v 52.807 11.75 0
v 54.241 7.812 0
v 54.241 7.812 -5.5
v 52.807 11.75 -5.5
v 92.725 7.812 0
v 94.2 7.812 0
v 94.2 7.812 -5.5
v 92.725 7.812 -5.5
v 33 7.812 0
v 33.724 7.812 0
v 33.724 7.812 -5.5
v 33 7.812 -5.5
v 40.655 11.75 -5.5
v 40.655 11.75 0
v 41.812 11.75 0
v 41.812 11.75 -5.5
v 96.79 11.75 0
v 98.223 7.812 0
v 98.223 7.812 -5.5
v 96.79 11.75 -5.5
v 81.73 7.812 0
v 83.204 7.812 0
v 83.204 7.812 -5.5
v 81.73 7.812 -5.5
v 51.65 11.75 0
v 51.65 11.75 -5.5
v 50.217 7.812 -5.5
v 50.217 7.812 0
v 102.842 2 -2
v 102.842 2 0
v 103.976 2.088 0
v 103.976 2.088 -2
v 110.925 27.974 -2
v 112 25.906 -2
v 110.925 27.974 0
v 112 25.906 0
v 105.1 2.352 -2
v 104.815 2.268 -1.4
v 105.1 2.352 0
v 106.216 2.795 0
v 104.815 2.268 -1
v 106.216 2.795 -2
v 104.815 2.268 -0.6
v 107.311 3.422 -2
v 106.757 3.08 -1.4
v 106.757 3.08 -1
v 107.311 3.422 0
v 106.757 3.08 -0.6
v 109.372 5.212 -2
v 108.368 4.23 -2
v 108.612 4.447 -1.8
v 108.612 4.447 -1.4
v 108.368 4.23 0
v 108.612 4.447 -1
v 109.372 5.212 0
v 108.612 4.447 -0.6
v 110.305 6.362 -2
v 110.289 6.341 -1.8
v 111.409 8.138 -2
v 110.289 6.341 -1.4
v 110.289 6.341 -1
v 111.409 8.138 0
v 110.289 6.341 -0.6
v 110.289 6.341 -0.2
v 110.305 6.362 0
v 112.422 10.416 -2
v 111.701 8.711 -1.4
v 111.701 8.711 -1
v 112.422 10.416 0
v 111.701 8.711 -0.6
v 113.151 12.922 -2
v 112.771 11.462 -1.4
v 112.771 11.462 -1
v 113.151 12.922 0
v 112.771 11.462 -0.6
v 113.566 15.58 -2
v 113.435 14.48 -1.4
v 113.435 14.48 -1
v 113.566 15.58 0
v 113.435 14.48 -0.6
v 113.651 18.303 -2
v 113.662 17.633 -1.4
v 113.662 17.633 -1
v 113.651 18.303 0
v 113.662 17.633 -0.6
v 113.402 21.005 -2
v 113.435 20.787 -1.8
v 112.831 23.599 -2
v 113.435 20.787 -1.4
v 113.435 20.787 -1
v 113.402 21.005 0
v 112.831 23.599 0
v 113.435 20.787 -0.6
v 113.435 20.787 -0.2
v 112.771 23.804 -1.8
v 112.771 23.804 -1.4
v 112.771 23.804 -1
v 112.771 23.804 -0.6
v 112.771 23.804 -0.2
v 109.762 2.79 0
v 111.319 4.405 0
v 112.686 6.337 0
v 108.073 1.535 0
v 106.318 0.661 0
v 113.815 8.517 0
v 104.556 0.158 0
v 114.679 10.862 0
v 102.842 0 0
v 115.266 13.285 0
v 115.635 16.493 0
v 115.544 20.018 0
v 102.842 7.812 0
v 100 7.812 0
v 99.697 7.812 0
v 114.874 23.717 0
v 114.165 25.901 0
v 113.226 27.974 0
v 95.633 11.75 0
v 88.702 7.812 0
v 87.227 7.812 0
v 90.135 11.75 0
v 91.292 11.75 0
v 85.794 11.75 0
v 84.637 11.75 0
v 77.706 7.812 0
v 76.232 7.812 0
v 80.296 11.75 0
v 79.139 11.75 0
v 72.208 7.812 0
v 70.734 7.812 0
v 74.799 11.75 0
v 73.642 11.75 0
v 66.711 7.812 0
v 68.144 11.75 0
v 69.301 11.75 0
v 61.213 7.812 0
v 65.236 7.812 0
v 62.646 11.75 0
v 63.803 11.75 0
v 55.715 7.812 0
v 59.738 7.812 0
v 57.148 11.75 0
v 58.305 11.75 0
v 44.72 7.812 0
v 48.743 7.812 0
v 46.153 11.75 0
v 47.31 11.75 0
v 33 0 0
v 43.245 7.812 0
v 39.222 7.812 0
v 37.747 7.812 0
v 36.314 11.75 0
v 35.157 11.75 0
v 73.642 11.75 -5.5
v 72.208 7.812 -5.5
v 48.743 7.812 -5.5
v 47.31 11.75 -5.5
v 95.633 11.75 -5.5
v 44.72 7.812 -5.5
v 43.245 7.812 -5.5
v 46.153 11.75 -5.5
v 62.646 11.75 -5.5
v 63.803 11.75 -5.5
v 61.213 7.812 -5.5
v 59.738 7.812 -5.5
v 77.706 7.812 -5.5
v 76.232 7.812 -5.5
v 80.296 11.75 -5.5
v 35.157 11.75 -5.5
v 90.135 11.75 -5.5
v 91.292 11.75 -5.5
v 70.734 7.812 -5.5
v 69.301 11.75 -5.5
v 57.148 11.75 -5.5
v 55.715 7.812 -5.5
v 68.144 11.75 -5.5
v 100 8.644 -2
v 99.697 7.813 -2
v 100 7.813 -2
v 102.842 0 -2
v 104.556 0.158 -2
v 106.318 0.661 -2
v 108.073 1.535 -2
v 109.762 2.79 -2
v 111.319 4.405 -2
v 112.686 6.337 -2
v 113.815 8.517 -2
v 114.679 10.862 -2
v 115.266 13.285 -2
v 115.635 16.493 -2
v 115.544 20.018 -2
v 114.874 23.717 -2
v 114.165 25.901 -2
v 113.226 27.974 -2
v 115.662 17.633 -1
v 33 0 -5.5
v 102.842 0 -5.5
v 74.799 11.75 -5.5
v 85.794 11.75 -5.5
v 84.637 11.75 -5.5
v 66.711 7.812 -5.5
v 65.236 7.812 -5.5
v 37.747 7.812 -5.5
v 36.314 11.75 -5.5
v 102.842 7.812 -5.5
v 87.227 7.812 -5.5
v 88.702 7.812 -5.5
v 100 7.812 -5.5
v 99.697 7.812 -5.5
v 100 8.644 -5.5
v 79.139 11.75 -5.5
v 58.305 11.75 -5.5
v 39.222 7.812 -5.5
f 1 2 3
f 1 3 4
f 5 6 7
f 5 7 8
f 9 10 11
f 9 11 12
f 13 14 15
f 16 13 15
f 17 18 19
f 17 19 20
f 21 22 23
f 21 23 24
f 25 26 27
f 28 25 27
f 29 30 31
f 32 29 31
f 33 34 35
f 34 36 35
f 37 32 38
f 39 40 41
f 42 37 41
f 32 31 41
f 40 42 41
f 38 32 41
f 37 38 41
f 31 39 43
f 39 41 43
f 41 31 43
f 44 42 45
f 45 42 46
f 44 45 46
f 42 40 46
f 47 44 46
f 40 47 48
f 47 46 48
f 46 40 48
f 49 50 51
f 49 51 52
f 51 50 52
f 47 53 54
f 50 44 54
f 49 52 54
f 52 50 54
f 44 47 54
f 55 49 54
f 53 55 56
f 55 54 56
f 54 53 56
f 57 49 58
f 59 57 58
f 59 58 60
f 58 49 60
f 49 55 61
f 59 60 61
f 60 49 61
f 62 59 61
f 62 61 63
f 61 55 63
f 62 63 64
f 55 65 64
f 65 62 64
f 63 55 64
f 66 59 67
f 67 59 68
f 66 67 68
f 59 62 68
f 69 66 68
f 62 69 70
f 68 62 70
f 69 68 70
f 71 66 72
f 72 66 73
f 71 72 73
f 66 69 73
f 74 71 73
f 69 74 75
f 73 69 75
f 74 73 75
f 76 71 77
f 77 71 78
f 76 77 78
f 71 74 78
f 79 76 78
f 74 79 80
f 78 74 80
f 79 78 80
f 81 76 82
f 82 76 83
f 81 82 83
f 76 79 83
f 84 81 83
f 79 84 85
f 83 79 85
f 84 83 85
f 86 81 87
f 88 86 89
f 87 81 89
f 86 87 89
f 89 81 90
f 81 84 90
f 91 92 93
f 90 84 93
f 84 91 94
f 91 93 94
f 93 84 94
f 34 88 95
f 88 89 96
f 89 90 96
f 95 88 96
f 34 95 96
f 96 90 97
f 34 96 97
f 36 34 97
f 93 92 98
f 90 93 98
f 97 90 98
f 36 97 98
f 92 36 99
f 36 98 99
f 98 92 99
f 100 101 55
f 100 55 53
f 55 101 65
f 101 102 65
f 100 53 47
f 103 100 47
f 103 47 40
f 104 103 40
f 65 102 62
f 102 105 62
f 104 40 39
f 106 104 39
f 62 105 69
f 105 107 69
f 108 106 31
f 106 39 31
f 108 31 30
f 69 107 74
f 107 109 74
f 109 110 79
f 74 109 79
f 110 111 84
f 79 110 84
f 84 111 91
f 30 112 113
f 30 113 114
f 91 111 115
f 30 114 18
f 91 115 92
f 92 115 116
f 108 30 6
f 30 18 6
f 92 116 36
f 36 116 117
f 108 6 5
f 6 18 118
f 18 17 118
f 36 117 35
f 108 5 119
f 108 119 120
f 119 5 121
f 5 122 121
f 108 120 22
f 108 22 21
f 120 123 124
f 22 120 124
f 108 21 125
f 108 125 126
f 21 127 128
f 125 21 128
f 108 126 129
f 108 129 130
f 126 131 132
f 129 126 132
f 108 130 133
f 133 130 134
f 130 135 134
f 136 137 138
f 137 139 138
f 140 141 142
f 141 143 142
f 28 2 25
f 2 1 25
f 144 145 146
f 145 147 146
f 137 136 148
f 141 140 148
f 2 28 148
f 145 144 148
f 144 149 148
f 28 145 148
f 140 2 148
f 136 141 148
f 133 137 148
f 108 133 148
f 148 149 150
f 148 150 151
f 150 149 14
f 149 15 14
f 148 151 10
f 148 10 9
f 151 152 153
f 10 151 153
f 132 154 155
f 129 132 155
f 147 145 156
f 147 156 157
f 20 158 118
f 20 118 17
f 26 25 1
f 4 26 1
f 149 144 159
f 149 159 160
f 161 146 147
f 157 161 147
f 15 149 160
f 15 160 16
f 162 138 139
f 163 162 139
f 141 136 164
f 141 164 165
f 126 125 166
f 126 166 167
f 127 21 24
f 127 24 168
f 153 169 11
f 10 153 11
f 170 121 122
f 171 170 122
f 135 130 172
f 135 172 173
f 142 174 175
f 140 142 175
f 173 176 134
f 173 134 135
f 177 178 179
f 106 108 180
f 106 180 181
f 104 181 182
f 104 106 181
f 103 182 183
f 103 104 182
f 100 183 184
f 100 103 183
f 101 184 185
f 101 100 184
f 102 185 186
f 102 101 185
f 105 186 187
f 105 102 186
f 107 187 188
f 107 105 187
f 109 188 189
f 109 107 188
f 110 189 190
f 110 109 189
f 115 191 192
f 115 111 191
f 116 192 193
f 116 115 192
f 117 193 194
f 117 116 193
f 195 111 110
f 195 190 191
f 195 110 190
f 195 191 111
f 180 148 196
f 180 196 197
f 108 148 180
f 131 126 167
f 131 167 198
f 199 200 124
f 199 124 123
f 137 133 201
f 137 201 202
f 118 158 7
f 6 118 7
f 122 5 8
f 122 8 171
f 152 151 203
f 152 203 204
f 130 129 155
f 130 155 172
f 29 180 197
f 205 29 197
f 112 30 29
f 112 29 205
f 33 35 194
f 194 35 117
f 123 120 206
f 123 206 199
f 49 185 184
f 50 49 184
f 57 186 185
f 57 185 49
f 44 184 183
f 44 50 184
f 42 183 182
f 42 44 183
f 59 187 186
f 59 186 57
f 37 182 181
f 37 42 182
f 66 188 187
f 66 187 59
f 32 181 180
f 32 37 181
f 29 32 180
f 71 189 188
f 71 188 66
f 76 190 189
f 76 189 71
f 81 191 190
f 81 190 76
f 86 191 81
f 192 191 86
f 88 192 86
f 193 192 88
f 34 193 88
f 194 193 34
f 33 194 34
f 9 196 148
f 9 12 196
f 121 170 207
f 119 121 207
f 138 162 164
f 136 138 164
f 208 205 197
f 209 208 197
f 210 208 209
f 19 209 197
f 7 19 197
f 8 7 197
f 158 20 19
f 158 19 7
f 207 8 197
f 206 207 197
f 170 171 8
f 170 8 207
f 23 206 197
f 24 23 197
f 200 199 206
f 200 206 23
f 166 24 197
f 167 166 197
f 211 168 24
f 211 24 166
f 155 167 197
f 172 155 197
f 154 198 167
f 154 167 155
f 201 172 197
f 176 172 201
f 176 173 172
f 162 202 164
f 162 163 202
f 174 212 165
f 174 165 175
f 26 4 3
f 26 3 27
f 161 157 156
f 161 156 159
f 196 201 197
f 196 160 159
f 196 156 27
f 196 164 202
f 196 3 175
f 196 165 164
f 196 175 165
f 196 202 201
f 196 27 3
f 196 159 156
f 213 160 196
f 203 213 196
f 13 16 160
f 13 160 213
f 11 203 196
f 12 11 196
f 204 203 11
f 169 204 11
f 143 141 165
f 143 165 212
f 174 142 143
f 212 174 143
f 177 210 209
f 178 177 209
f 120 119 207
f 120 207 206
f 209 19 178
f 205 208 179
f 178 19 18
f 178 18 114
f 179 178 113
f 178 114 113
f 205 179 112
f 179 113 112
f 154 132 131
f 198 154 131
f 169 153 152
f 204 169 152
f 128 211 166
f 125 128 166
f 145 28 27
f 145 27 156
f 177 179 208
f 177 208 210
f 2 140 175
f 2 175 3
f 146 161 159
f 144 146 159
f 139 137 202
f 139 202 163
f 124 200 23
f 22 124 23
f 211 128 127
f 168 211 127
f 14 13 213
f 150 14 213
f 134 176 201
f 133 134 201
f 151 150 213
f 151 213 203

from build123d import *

# Parameters (mm, degrees)
BLANKSKE_W          = 100
BLANKSKE_H          = 11.75
BLANK_DEPTH         = 10
TOOTHCUTSIM_DEPTH   = 102.183311371
TEETHCUTS_COUNT     = 19
TEETHCUTS_PITCH     = 5.497787137
SKETCH_3_W          = 2.841503757
SKETCH_3_H          = 7.8125
EXTRUDE_1_DEPTH     = 10
EXTRUDE_2_DEPTH     = 2
SKETCH_6_W          = 102.841503757
SKETCH_6_H          = 15
CUT_EXTRUDE_2_DEPTH = 4.5
SKETCH_7_W          = 1.160244479
SKETCH_7_H          = 1.204796587
CUT_EXTRUDE_3_DEPTH = 2
SKETCH_8_W          = 16.666168626
SKETCH_8_H          = 26.64996686
CUT_EXTRUDE_5_DEPTH = 33
SKETCH_11_W         = 35.593118123
SKETCH_11_H         = 14.823069144
CUT_EXTRUDE_6_DEPTH = 2


with BuildPart() as part:
    # BlankSke → Blank (new body)
    with BuildSketch(Plane.XY):
        with Locations((50, 5.875)):
            Rectangle(BLANKSKE_W, BLANKSKE_H)
    extrude(amount=-BLANK_DEPTH)

    # TooCutSkeSim → ToothCutSim (cut, through all)
    with BuildSketch(Plane.XY):
        Polygon((0.737261897, 7.8125), (-0.737261897, 7.8125), (-2.179639538, 11.7754), (2.179639538, 11.7754), align=None)
    toothcutsim = extrude(amount=-TOOTHCUTSIM_DEPTH, mode=Mode.SUBTRACT)

    # TeethCuts: ToothCutSim ×19
    with Locations(*[(i * TEETHCUTS_PITCH, 0, 0) for i in range(1, TEETHCUTS_COUNT)]):
        add(toothcutsim, mode=Mode.SUBTRACT)

    # 草图3 → 凸台-拉伸1 (add)
    with BuildSketch(Plane.XY):
        with Locations((101.420751878, 3.90625)):
            Rectangle(SKETCH_3_W, SKETCH_3_H)
    extrude(amount=-EXTRUDE_1_DEPTH)

    # 草图5 → 凸台-拉伸2 (add)
    with BuildSketch(Plane.XY):
        with BuildLine():
            Line((102.841503757, 0), (102.841503757, 2))
            add(Edge.make_bspline(
                [(102.841503757, 2), (103.50529782, 2), (104.816875637, 2.17763142), (107.423271086, 3.255207974), (110.468253334, 6.015081397), (113.046627851, 11.280911472), (113.96899522, 17.633214309), (113.046627851, 23.985517146), (110.468253334, 29.251347221), (107.423271086, 32.011220644), (104.816875637, 33.088797198), (103.50529782, 33.266428618), (102.841503757, 33.266428618)],
                knots=[3.141592654, 3.141592654, 3.141592654, 3.141592654, 3.337942194, 3.534291735, 3.926990817, 4.319689899, 4.71238898, 5.105088062, 5.497787144, 5.890486225, 6.086835766, 6.283185307, 6.283185307, 6.283185307, 6.283185307], degree=3))
            Line((102.841503757, 33.266428618), (102.841503757, 35.266428618))
            add(Edge.make_bspline(
                [(102.841503757, 0), (115.66153943, 0), (115.66153943, 17.633214309), (115.66153943, 35.266428618), (102.841503757, 35.266428618)],
                knots=[3.141592654, 3.141592654, 3.141592654, 4.71238898, 4.71238898, 6.283185307, 6.283185307, 6.283185307], degree=2, weights=[1, 0.707106781, 1, 0.707106781, 1]))
        make_face()
    extrude(amount=-EXTRUDE_2_DEPTH)

    # 草图6 → 切除-拉伸2 (cut)
    with BuildSketch(Plane(origin=(0, 0, -10), x_dir=(-1, 0, 0), z_dir=(0, 0, -1))):
        with Locations((-51.420751879, 7.5)):
            Rectangle(SKETCH_6_W, SKETCH_6_H)
    extrude(amount=-CUT_EXTRUDE_2_DEPTH, mode=Mode.SUBTRACT)

    # 草图7 → 切除-拉伸3 (cut)
    with BuildSketch(Plane.XY):
        with Locations((99.931909363, 8.414898294)):
            Rectangle(SKETCH_7_W, SKETCH_7_H)
    extrude(amount=-CUT_EXTRUDE_3_DEPTH, mode=Mode.SUBTRACT)

    # 草图8 → 切除-拉伸5 (cut)
    with BuildSketch(Plane.ZY):
        Rectangle(SKETCH_8_W, SKETCH_8_H)
    extrude(amount=-CUT_EXTRUDE_5_DEPTH, mode=Mode.SUBTRACT)

    # 草图11 → 切除-拉伸6 (cut)
    with BuildSketch(Plane.XY):
        with Locations((104.465105415, 35.385155424)):
            Rectangle(SKETCH_11_W, SKETCH_11_H)
    extrude(amount=-CUT_EXTRUDE_6_DEPTH, mode=Mode.SUBTRACT)


solid = part.part
